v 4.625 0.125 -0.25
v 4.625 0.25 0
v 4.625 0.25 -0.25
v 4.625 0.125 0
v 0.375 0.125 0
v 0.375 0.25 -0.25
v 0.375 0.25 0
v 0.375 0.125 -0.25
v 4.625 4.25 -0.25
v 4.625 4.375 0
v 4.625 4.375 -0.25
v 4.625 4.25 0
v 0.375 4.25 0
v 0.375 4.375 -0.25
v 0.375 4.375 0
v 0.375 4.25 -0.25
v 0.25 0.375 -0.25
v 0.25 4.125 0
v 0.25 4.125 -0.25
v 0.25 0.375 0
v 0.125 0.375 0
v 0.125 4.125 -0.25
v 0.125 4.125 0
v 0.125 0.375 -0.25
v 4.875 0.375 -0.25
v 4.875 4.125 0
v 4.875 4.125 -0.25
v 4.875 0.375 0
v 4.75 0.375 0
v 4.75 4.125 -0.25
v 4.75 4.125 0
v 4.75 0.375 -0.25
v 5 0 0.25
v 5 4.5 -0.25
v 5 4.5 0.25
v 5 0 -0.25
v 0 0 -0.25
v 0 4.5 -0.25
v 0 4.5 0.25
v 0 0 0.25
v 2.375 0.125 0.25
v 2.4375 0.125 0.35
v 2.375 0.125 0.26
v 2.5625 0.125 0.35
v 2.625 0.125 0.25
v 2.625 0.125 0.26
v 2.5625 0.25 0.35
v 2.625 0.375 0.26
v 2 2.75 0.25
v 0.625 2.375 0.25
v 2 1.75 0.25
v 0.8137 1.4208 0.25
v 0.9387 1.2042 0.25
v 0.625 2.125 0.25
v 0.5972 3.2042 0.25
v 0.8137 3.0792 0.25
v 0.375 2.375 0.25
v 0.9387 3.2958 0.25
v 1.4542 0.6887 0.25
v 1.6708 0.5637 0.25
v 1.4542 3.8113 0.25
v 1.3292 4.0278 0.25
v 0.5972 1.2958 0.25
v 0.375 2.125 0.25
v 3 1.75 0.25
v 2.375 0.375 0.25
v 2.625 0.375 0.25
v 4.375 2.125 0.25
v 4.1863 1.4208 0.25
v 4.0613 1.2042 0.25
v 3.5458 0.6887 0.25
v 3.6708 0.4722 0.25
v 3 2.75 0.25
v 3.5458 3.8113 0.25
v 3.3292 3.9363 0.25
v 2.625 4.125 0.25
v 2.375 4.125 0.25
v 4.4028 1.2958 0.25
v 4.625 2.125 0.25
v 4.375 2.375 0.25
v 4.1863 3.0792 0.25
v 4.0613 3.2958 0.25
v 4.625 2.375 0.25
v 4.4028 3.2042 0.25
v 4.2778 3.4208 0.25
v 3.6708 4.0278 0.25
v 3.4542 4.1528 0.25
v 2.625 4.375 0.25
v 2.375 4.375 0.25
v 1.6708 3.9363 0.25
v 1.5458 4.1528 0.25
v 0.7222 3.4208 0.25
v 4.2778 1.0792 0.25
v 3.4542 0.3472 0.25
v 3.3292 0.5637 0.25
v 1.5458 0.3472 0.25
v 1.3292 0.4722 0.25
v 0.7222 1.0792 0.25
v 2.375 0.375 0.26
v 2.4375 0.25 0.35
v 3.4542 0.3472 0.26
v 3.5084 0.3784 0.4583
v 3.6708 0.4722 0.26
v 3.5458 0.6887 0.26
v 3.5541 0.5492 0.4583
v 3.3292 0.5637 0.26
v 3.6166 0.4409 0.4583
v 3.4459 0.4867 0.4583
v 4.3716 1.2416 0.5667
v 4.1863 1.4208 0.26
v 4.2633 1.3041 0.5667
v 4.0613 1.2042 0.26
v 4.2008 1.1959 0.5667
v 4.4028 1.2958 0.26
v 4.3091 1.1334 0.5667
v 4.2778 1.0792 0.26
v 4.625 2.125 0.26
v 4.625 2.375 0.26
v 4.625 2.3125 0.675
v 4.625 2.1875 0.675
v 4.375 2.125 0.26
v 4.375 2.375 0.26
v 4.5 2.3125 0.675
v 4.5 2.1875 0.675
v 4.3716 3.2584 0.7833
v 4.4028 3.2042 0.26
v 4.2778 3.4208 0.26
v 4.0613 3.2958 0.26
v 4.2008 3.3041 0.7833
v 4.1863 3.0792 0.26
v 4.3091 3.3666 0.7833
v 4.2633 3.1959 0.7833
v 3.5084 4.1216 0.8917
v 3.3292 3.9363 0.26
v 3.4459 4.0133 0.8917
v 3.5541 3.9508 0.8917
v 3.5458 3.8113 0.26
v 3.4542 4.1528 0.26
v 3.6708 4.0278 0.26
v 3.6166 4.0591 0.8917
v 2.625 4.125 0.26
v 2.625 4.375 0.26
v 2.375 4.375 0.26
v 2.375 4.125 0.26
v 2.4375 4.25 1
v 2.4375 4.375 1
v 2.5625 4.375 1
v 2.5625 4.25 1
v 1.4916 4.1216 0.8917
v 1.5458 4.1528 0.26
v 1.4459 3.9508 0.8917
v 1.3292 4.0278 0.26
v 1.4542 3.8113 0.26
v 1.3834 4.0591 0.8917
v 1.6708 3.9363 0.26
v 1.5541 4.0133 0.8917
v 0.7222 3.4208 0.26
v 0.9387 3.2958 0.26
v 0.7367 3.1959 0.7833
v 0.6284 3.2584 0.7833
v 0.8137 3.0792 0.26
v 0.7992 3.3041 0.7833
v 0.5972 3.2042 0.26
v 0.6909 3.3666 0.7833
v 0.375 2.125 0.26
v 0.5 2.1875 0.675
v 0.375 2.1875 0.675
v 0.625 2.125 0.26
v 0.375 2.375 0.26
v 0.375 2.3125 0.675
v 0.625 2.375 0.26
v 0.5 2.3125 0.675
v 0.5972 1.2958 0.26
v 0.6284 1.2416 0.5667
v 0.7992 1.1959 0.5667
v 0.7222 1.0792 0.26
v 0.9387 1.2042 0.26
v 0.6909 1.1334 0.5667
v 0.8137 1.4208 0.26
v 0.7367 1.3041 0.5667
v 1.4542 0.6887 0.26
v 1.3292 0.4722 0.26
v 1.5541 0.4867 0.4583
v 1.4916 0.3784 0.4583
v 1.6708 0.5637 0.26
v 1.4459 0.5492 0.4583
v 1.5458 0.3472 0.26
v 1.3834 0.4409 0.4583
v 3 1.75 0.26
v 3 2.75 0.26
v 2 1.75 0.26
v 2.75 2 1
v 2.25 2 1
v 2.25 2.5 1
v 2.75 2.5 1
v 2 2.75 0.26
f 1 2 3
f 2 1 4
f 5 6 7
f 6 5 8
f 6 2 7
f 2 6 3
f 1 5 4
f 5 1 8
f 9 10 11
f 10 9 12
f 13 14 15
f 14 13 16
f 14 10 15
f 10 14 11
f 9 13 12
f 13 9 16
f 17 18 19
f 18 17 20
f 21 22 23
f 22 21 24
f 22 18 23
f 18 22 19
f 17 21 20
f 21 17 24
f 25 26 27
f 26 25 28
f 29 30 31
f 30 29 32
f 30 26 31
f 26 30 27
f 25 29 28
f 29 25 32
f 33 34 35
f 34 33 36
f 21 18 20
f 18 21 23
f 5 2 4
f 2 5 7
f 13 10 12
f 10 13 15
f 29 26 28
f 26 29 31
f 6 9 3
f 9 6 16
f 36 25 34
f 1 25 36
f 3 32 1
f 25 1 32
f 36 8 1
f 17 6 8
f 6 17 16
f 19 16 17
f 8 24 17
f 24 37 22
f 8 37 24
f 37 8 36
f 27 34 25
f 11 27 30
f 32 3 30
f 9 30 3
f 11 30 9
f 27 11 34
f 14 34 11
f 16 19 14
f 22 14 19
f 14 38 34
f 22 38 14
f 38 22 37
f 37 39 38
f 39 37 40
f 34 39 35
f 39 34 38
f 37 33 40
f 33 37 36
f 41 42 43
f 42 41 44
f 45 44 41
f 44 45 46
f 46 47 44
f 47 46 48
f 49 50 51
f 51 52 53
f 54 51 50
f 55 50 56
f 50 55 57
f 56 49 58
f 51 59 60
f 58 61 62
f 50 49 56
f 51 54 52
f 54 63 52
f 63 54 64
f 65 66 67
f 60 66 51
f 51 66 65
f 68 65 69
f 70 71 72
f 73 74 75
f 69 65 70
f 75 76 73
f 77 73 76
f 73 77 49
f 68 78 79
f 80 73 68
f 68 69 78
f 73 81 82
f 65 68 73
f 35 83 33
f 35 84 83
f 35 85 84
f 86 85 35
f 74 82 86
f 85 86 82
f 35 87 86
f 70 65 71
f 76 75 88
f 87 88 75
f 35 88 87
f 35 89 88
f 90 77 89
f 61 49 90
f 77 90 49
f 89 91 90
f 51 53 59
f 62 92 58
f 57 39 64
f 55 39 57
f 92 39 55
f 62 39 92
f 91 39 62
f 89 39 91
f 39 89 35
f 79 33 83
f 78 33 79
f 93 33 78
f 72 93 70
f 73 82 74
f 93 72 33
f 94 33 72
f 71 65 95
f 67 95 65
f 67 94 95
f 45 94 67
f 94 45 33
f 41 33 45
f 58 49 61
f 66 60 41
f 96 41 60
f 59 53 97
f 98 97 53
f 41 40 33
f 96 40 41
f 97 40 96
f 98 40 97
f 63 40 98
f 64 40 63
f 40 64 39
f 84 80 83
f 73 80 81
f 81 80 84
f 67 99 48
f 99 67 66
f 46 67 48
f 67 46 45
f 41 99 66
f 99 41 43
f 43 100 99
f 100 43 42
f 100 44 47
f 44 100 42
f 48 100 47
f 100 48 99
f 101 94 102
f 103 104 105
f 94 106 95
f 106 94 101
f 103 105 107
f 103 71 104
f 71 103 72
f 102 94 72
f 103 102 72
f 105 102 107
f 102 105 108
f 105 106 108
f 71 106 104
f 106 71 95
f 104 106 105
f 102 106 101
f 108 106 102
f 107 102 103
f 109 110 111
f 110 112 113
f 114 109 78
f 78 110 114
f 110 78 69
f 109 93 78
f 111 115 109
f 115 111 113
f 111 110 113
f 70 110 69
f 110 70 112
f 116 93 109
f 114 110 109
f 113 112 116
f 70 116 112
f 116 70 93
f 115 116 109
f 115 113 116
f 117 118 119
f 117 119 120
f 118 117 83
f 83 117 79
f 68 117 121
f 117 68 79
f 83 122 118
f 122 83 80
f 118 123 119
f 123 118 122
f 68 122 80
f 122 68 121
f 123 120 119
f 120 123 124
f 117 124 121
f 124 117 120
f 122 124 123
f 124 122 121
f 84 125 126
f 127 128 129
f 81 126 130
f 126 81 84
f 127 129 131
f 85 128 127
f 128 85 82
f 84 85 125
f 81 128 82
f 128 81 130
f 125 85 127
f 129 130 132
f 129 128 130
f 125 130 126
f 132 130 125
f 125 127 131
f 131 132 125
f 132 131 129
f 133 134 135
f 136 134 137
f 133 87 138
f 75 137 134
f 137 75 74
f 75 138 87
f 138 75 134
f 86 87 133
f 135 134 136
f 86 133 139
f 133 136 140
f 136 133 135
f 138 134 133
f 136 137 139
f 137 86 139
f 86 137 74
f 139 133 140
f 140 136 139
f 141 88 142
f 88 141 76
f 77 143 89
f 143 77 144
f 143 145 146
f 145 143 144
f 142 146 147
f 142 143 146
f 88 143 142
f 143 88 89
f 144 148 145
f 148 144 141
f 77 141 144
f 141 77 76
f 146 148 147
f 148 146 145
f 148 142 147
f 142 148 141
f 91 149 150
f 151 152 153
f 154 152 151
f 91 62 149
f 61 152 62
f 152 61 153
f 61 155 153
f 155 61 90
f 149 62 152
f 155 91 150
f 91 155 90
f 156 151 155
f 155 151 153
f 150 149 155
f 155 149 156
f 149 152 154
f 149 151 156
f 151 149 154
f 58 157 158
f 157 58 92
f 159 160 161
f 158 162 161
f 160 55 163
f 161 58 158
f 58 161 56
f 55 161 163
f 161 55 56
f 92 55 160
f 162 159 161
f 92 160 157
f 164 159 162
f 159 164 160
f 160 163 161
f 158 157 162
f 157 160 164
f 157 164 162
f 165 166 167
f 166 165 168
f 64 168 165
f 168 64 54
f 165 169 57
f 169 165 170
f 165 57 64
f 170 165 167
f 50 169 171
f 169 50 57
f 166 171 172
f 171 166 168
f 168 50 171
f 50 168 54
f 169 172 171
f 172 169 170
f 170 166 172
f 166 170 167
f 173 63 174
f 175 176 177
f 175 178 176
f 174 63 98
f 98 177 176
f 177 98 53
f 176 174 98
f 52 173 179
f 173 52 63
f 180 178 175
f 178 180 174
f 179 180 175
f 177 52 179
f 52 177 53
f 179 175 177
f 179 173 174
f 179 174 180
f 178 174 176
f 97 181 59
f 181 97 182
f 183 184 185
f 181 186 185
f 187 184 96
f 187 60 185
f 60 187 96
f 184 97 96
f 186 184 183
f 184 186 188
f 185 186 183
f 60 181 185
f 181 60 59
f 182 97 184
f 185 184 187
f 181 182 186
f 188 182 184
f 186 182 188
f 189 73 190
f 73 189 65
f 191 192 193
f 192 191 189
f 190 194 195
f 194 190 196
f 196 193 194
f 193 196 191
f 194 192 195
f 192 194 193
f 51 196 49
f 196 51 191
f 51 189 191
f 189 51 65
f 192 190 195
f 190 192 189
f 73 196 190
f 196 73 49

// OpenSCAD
// Top
// units: inches

epsilon = 0.01;

width = 5;
depth = 4.5;
base_thickness = 1/4;

antenna_thickness = 0.4;
antenna_length = 2.40;

notch_height = 1/4;
notch_gap = 1/8;
notch_support = 1/8;

center_height = 3/4;
center_sides = 1;

pole_sides = 1/4;
pole_count = 12;
pole_radius = 2;
pole_height_min = 0.1;
pole_height_max = center_height;

// base
cube([width, depth, base_thickness]);

// notches
notch_sub = 2 * notch_support + notch_gap;
translate([0, 0, -notch_height])
difference() {
    cube([width, depth, notch_height]);
    
    // 4 cuts
    union() {
        translate([notch_sub, notch_support, -epsilon])
        cube([width - 2 * notch_sub, notch_gap, notch_height + 2 * epsilon]);
        
        translate([notch_sub, depth - notch_sub + notch_support, -epsilon])
        cube([width - 2 * notch_sub, notch_gap, notch_height + 2 * epsilon]);
        
        translate([notch_support, notch_sub, -epsilon])
        cube([notch_gap, depth - 2 * notch_sub, notch_height + 2 * epsilon]);
        
        translate([width - notch_sub + notch_support, notch_sub, -epsilon])
        cube([notch_gap, depth - 2 * notch_sub, notch_height + 2 * epsilon]);
    }
}

// center
translate([width / 2, depth / 2, base_thickness])
hull() {
    translate([0, 0, center_height / 2])
    cube([center_sides / 2, center_sides / 2, center_height], center = true);
    
    translate([0, 0, epsilon / 2])
    cube([center_sides, center_sides, epsilon], center = true);
}

// circle
translate([width / 2, depth / 2, base_thickness])
for (i=[0:pole_count-1]) {
    height = pole_height_min + (2 * min(i, pole_count - i)) * (pole_height_max - pole_height_min) / pole_count;
    rotate([0, 0, i * 360 / pole_count])
    translate([0, - pole_radius, height / 2])
    hull() {
        translate([0, -pole_sides / 4, 0])
        cube([pole_sides / 2, pole_sides / 2, height], center = true);
        
        translate([0, 0, epsilon / 2 - height / 2])
        cube([pole_sides, pole_sides, epsilon], center = true);
    }
}
